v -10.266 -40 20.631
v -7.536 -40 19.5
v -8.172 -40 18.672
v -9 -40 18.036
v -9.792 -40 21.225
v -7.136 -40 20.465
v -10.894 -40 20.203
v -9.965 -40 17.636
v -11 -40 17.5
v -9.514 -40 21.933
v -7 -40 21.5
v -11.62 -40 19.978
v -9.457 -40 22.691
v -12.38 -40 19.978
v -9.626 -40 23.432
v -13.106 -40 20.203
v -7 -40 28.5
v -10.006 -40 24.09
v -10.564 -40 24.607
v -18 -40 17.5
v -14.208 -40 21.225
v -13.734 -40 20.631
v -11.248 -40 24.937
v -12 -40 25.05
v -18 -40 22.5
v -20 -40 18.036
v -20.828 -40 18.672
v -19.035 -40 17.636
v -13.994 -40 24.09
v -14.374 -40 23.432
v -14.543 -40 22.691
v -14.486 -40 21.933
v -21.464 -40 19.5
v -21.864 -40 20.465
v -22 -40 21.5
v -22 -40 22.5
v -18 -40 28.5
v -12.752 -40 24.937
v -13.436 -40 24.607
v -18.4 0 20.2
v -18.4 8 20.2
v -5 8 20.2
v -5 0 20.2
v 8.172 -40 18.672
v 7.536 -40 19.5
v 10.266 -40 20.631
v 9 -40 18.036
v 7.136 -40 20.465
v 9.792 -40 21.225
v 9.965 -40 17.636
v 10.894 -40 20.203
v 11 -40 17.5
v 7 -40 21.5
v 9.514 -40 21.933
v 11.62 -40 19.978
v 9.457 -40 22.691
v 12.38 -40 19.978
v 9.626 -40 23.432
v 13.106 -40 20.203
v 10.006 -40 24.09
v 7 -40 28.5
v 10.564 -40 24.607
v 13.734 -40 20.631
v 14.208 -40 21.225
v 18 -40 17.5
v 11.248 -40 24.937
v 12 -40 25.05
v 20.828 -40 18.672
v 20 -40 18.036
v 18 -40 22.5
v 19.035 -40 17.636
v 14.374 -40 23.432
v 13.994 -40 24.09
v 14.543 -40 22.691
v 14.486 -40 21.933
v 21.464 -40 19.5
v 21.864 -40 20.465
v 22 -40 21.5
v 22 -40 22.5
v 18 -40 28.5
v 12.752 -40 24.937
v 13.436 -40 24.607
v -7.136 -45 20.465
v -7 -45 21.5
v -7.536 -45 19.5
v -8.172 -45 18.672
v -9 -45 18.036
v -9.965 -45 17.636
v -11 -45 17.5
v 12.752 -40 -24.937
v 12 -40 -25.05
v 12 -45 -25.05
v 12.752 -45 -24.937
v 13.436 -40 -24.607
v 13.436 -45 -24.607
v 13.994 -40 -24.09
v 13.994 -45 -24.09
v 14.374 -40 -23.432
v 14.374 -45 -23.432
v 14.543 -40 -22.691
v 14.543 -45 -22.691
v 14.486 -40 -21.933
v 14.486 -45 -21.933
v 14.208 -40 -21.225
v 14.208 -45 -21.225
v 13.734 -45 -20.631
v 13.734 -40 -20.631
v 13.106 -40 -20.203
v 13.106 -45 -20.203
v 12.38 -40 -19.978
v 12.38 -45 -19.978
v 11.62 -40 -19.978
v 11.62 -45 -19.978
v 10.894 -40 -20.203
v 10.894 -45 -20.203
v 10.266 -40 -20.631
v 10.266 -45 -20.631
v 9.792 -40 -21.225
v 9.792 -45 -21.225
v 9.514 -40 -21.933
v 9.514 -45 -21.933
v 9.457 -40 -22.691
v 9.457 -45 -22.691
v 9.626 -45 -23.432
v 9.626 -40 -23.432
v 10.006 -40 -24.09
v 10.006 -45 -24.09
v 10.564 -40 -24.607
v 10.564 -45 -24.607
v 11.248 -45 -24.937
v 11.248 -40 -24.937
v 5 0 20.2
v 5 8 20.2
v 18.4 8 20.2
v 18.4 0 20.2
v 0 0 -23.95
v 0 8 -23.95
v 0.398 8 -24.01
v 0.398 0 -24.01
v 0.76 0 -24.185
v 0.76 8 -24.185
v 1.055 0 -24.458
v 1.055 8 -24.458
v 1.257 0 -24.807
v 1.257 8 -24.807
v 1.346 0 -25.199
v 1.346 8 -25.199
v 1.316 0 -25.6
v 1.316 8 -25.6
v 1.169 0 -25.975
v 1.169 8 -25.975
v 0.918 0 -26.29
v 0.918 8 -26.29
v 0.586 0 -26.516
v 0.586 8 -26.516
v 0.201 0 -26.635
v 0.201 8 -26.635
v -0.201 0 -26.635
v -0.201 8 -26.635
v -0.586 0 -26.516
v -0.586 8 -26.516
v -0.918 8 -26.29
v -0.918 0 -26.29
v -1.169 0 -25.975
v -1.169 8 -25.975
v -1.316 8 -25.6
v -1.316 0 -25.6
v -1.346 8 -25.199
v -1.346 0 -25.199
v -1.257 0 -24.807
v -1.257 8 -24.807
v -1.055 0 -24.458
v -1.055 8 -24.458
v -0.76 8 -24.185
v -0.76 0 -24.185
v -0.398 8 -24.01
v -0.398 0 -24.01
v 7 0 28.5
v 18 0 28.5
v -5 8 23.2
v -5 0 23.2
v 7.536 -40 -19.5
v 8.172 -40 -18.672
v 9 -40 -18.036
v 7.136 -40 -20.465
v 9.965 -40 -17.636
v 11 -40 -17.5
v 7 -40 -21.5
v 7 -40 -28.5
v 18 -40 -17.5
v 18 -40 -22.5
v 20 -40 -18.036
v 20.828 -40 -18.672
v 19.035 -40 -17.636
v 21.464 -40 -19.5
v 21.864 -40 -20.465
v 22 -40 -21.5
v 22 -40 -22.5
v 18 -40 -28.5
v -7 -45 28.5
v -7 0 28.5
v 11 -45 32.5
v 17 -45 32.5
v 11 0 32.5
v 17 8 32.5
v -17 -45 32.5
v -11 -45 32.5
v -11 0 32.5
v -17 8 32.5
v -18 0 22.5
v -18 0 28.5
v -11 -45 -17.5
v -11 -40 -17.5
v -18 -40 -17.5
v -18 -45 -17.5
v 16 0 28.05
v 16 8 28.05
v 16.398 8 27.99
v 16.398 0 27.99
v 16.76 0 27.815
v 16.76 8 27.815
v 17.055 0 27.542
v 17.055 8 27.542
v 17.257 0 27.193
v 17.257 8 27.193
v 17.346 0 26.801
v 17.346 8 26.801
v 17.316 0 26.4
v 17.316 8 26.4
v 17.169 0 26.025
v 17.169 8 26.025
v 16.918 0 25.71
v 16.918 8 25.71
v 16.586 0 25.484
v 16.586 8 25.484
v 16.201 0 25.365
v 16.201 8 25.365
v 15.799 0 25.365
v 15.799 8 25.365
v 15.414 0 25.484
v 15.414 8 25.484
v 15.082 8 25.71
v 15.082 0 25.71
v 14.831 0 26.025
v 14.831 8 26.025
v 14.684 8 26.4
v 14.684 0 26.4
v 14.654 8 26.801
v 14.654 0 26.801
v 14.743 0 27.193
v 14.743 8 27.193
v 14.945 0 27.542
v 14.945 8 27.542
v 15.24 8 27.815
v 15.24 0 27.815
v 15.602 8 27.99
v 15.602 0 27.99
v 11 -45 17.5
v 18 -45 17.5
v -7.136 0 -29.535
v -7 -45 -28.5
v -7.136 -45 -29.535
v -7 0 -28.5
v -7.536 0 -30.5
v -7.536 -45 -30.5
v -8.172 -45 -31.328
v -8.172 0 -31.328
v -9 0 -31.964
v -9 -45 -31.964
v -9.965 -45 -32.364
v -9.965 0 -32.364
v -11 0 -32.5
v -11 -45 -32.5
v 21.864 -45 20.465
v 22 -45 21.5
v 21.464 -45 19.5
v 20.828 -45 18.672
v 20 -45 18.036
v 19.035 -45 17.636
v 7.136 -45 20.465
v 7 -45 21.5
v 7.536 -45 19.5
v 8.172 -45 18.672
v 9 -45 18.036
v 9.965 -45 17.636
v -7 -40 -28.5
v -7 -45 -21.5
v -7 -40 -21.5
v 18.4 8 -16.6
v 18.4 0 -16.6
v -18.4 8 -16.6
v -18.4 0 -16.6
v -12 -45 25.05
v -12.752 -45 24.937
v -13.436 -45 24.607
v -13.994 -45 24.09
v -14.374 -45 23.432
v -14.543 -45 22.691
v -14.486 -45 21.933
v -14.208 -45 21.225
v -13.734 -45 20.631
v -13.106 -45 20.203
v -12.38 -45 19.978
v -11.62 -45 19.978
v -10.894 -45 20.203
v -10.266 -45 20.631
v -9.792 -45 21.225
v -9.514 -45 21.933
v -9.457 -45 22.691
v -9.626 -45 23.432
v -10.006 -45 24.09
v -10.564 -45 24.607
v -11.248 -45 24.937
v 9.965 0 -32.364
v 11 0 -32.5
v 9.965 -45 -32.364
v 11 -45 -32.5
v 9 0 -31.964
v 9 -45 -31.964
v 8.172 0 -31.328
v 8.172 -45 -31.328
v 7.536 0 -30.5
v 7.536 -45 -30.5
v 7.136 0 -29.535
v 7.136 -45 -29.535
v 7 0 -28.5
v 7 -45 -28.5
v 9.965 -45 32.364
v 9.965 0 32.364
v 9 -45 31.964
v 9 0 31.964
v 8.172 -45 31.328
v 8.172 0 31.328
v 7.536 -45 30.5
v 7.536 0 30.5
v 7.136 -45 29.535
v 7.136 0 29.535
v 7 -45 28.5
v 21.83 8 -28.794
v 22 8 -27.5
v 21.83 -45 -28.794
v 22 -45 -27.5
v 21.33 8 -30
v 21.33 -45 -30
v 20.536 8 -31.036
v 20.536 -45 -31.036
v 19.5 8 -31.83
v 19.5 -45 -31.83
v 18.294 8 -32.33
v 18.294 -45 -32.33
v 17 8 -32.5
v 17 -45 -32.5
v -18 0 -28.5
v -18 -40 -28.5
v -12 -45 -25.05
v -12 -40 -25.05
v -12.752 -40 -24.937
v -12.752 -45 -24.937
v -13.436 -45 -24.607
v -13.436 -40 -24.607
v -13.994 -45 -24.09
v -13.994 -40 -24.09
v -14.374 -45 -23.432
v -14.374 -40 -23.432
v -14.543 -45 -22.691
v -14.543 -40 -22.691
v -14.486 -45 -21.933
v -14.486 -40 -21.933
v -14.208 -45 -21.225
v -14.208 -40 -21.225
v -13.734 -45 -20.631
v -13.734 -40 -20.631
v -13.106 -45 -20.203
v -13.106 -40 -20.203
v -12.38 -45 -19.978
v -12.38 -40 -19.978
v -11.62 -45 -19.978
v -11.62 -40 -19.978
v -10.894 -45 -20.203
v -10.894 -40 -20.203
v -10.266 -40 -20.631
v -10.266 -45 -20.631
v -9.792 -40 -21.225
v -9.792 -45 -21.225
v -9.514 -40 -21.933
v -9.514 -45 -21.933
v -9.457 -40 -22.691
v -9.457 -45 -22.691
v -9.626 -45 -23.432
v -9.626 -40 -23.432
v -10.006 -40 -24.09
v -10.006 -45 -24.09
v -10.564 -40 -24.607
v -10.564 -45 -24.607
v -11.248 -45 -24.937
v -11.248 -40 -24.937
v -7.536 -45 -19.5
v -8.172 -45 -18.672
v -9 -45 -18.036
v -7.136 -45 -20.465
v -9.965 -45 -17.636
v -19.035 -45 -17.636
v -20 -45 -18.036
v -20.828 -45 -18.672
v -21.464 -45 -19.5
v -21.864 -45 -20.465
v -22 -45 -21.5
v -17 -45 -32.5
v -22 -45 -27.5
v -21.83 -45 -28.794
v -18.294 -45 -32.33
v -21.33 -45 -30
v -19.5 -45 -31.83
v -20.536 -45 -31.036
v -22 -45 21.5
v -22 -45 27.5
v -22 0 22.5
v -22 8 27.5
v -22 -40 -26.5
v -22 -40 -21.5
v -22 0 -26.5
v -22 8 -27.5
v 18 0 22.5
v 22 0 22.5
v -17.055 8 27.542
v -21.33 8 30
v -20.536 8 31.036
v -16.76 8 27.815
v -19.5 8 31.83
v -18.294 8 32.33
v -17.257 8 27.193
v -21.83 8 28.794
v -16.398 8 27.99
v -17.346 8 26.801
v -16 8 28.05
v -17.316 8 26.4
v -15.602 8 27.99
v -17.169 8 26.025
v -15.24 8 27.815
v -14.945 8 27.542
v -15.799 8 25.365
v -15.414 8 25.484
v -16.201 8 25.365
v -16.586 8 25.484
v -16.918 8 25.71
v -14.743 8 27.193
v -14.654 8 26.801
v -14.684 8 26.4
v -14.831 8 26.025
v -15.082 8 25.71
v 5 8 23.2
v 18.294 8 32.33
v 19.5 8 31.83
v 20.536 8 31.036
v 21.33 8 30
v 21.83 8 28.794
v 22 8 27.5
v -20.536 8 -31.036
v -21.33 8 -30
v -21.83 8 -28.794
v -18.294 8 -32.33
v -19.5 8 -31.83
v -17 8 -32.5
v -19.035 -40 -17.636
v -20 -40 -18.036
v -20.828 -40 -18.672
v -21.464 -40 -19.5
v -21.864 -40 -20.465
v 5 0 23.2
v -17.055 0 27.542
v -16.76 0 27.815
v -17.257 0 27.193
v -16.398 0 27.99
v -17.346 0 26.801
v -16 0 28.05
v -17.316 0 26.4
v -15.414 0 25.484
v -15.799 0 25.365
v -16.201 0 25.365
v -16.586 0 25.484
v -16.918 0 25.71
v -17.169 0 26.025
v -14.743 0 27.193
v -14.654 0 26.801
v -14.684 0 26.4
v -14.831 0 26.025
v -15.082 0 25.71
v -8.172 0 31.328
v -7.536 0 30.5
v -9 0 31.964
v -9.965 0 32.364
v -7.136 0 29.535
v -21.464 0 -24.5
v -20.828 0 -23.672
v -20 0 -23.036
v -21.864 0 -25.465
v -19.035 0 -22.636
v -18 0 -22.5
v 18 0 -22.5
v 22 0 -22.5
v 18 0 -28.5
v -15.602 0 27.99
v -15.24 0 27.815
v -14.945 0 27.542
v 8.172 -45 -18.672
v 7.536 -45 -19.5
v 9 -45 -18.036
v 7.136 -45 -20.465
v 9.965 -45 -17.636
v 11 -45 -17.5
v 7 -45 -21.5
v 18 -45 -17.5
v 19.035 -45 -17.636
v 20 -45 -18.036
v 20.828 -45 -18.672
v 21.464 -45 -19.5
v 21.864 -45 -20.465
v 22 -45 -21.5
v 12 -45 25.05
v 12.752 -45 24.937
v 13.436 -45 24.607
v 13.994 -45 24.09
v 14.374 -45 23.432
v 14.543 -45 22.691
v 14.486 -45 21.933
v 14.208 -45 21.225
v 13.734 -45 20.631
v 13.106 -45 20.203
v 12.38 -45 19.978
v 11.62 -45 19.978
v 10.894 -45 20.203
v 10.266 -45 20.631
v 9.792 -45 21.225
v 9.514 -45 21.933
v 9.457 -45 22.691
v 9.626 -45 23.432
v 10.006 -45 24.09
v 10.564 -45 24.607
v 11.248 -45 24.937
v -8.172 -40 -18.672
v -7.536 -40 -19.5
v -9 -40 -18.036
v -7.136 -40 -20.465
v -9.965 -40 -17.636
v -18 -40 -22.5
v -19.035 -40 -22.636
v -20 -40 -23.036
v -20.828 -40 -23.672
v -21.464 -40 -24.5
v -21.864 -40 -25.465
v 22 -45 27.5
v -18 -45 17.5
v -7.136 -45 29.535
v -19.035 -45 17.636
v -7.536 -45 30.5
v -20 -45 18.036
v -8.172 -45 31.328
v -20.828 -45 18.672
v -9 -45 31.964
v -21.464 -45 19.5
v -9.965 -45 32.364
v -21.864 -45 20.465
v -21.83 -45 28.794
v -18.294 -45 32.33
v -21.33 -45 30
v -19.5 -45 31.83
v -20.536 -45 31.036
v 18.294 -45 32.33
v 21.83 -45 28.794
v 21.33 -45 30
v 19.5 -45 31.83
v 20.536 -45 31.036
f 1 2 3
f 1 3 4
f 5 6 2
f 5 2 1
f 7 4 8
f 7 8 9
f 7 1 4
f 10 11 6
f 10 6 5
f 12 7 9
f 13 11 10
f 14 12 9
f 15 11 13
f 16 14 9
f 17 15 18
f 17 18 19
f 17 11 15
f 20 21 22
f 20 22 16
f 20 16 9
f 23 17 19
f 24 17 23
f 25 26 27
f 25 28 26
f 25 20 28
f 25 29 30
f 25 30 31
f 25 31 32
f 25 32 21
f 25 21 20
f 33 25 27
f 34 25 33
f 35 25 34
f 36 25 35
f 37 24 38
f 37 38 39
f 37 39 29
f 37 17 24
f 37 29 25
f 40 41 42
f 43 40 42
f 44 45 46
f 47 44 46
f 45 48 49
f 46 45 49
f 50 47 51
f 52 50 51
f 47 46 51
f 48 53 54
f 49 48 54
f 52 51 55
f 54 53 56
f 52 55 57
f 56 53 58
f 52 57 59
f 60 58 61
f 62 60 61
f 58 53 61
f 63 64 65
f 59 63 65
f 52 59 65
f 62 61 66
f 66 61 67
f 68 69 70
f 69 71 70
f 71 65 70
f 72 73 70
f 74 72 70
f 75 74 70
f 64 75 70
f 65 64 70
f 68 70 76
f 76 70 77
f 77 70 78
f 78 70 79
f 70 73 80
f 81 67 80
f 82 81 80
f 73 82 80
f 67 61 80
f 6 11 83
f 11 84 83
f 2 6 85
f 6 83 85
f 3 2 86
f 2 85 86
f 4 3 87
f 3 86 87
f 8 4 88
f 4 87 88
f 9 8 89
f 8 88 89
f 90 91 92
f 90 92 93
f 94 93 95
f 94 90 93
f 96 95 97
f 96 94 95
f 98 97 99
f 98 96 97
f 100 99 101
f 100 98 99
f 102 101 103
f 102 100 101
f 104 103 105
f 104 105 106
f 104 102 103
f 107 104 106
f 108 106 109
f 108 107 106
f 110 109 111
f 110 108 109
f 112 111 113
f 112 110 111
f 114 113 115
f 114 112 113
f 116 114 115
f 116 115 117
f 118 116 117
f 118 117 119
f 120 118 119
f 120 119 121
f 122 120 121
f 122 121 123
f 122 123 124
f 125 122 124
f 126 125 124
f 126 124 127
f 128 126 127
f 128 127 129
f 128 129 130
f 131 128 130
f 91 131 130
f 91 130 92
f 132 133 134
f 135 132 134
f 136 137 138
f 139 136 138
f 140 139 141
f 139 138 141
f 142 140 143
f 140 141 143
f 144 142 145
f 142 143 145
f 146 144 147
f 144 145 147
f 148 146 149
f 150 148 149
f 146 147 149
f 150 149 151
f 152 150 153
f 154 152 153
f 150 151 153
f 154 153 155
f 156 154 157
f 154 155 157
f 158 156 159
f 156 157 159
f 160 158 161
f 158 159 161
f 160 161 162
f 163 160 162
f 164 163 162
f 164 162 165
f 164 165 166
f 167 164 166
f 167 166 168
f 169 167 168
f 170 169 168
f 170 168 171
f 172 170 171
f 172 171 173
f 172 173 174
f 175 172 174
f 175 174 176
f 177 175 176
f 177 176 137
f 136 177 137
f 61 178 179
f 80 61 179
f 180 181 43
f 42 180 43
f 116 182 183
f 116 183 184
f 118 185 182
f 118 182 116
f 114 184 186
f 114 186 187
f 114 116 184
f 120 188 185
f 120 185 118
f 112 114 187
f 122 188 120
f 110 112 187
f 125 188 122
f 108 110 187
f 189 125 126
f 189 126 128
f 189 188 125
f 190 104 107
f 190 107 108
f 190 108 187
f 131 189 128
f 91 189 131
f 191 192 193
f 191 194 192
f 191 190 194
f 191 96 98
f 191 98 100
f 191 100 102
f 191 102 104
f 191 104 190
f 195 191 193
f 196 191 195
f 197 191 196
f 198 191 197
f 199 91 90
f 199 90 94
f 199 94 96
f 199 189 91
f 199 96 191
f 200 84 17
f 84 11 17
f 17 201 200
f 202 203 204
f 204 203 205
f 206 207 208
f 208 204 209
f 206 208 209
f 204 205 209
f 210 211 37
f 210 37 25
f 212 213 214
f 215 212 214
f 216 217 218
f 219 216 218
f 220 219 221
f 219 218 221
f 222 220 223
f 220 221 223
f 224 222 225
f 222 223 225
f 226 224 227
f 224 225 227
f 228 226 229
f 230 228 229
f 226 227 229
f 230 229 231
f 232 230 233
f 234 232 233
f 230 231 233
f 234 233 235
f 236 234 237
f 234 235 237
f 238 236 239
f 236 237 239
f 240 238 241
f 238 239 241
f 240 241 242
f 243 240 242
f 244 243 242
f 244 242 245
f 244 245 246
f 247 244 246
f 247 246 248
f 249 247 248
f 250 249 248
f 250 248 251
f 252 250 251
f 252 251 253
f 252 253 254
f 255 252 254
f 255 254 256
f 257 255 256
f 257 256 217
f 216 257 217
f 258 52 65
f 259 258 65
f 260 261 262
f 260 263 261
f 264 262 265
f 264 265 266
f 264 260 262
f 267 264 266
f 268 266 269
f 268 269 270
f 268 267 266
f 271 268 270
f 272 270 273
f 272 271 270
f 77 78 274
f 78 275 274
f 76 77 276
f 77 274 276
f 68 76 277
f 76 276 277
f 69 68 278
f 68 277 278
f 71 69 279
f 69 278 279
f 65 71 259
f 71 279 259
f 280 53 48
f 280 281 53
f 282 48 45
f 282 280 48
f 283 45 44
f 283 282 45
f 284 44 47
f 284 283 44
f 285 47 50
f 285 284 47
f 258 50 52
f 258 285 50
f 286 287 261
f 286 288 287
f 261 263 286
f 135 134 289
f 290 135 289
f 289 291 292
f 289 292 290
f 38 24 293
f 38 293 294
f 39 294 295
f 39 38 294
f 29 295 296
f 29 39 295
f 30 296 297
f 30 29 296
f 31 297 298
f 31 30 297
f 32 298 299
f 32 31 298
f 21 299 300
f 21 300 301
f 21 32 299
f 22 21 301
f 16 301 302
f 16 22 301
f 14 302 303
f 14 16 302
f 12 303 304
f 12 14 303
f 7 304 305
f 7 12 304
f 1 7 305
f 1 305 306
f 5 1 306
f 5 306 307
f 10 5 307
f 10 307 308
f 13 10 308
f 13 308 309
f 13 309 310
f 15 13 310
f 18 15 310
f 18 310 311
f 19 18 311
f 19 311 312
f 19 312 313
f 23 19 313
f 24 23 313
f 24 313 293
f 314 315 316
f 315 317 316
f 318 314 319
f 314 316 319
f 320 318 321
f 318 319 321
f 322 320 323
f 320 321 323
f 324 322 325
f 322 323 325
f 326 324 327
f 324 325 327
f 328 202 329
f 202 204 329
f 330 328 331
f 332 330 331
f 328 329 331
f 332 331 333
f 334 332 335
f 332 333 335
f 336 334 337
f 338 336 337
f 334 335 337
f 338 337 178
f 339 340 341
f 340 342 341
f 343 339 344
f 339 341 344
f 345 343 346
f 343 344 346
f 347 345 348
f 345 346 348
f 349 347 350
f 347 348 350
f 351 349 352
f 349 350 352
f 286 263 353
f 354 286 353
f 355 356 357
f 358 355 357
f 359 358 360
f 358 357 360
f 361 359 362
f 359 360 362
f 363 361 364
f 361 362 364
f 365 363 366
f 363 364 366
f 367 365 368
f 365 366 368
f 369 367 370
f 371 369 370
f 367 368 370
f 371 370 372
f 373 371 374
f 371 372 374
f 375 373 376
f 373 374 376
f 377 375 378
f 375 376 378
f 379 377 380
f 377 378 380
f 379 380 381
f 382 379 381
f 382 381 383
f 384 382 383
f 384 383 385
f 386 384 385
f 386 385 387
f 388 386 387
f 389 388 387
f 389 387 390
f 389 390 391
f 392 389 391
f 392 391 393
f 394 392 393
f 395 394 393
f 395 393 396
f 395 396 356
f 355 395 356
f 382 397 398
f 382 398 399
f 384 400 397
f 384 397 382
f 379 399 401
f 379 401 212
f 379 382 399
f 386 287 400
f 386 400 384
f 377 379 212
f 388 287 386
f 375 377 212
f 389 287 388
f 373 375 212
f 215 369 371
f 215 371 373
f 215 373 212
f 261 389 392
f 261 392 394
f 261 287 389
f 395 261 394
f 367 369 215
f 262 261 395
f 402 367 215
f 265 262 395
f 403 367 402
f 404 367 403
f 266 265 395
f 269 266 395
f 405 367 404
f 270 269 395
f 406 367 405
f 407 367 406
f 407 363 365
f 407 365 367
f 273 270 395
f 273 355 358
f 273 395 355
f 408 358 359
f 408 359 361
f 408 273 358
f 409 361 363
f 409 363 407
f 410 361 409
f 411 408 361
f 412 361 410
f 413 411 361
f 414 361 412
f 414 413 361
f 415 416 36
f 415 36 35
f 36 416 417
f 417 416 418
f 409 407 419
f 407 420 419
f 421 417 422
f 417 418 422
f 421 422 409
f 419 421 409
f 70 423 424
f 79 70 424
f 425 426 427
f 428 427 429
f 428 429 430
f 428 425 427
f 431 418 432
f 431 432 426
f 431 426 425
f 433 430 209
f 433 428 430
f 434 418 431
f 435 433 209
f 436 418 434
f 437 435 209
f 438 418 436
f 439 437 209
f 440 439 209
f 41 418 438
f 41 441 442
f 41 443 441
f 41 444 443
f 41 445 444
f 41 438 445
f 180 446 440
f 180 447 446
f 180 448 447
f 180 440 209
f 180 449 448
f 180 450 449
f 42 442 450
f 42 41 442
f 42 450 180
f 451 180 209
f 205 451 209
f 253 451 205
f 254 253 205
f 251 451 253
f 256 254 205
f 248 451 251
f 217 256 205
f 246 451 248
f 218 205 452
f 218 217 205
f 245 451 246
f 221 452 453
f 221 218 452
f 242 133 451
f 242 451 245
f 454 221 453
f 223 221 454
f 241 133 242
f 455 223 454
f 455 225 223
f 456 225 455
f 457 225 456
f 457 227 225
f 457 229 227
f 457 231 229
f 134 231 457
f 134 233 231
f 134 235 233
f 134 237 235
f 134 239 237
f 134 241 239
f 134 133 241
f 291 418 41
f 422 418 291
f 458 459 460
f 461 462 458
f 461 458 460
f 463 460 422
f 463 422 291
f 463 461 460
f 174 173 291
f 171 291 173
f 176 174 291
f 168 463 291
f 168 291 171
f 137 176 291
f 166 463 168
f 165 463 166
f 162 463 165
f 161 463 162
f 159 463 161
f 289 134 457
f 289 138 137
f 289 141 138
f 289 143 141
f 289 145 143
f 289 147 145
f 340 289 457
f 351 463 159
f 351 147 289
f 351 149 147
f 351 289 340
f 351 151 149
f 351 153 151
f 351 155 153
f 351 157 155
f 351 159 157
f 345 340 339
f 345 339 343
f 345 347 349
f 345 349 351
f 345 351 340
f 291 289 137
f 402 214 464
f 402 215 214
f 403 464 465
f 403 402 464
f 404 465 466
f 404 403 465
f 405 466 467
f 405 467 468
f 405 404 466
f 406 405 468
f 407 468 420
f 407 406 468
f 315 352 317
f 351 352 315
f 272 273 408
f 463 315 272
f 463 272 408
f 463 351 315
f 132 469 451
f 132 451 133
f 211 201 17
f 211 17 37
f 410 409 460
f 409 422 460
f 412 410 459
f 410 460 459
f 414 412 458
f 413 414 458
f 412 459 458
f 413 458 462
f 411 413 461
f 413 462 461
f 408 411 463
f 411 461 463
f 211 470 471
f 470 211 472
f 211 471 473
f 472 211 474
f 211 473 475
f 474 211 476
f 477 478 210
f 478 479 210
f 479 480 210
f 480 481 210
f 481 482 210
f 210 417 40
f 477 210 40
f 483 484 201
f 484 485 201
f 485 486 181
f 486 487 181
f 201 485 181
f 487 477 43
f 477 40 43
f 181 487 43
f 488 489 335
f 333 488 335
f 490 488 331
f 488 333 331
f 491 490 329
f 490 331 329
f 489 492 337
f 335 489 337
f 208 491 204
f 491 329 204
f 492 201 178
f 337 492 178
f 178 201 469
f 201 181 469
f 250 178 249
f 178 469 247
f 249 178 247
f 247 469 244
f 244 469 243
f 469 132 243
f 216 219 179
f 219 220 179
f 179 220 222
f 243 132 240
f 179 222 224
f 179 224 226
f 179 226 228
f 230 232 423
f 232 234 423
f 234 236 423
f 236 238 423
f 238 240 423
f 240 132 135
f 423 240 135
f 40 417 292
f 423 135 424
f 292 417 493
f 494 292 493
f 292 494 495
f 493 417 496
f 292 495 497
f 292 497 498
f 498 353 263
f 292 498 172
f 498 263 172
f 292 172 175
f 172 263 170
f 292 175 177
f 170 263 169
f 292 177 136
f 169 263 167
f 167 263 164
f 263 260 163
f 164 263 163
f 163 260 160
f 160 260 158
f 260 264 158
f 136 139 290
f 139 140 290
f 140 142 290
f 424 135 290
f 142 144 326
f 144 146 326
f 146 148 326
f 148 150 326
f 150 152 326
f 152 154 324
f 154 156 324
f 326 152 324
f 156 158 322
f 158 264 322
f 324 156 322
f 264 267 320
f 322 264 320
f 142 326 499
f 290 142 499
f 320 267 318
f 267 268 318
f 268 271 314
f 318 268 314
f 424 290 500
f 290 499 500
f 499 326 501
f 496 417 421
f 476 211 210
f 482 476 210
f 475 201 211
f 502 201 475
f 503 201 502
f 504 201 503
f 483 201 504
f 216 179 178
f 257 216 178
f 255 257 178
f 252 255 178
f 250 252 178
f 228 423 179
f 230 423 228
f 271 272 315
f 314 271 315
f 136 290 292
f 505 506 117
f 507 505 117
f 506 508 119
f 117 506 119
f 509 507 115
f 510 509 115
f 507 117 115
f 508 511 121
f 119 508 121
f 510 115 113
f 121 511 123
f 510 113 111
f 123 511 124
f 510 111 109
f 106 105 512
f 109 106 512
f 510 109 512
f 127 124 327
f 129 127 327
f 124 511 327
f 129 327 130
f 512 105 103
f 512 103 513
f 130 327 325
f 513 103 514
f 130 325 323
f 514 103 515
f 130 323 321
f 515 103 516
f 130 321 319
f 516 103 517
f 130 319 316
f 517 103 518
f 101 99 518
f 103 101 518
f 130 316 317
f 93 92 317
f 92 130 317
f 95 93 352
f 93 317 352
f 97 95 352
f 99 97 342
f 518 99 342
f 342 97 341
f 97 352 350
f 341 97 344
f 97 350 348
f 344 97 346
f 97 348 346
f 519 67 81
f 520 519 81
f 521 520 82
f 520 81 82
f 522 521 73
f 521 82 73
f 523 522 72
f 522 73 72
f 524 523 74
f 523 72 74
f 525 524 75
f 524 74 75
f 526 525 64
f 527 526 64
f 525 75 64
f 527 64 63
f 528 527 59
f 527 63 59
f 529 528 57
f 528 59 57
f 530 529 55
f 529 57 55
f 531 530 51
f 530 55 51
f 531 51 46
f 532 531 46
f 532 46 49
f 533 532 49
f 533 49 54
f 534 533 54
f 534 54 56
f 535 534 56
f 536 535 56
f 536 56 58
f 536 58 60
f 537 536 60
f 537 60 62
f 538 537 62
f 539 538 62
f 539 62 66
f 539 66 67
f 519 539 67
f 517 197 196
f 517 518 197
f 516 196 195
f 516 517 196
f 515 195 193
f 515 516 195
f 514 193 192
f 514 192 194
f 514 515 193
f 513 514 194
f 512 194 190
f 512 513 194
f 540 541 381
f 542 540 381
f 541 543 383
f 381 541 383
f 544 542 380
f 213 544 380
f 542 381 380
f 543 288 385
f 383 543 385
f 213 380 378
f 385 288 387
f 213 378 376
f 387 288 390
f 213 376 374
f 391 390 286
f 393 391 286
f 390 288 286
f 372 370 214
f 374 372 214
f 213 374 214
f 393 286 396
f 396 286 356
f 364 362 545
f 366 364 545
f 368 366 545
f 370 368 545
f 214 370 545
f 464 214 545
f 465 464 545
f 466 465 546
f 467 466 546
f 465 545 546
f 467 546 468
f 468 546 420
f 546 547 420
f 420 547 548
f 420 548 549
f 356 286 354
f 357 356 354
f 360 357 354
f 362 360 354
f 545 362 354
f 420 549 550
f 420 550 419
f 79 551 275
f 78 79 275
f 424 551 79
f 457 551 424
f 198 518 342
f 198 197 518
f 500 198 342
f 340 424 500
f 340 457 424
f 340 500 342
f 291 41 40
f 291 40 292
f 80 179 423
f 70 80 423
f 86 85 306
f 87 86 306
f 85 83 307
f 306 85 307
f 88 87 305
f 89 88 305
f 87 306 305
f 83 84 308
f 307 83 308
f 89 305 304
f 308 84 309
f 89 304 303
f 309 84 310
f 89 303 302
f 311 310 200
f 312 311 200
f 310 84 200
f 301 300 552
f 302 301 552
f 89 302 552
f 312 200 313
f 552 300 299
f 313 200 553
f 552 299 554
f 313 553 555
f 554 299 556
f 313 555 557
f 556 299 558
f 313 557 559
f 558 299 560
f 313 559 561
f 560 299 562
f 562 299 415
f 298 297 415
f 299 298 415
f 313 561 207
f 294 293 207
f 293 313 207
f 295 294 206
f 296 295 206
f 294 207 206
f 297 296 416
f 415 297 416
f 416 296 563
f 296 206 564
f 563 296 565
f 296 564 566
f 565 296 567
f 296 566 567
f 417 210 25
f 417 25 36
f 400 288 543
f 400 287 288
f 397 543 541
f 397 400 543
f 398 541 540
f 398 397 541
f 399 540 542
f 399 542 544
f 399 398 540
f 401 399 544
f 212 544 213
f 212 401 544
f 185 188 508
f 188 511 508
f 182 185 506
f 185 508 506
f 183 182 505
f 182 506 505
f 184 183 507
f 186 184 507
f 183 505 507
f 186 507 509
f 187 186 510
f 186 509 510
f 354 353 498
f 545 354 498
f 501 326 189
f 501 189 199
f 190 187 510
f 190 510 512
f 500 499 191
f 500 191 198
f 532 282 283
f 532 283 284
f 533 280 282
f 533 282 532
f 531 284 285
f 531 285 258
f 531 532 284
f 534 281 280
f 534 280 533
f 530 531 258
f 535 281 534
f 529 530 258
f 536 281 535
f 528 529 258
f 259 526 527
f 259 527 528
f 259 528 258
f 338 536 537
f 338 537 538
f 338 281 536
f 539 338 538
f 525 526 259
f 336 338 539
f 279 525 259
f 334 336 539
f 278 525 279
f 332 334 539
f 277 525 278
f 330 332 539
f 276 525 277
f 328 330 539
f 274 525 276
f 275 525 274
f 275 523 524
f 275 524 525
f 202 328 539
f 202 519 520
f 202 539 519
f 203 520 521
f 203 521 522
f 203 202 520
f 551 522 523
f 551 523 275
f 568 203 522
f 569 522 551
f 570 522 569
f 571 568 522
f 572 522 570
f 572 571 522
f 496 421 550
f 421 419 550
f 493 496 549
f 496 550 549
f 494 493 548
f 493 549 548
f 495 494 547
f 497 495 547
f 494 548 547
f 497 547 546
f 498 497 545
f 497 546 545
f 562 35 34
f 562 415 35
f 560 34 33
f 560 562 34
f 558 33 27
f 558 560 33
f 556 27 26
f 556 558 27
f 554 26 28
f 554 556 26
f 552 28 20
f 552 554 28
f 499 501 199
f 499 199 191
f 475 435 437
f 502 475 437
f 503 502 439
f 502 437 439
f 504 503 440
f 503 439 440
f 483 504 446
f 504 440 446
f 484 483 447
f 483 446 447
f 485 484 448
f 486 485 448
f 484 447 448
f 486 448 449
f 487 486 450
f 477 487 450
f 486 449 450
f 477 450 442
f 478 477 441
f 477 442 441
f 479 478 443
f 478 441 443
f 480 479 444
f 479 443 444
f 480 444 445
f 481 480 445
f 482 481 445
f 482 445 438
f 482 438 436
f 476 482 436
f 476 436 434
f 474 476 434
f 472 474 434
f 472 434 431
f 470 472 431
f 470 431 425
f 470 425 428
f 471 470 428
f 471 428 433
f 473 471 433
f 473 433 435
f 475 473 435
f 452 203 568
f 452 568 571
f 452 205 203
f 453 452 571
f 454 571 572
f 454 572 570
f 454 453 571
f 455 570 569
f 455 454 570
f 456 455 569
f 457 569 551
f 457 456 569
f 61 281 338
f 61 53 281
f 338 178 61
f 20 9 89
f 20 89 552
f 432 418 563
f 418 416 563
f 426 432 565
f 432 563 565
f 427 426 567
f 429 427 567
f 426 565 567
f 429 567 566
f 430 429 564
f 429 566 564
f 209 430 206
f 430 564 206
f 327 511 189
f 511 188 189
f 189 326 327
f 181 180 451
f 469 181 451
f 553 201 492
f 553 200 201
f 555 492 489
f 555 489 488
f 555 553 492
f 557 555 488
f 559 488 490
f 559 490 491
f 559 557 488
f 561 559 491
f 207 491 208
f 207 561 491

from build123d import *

# Parameters (mm, degrees)
SKETCH1_W               = 44
SKETCH1_H               = 65
BOSS_EXTRUDE1_DEPTH     = 8
CUT_EXTRUDE1_REACH      = 42.053
SKETCH2_W               = 36.8
SKETCH2_H               = 36.8
CUT_EXTRUDE2_REACH      = 42.053
SKETCH3_R               = 1.35
BOSS_EXTRUDE2_DEPTH     = 40
SKETCH6_W               = 15
SKETCH6_H               = 15
BOSS_EXTRUDE3_DEPTH     = 5
CUT_EXTRUDE3_REACH      = 64.002
SKETCH7_R               = 2.55
MIRROR2_COPY_1_DEPTH    = 40
MIRROR2_COPY_2_SKETCH_W = 15
MIRROR2_COPY_2_SKETCH_H = 15
MIRROR2_COPY_2_DEPTH    = 5
MIRROR2_COPY_3_REACH    = 64.002
MIRROR2_COPY_3_SKETCH_R = 2.55
CUT_EXTRUDE4_REACH      = 67.949
SKETCH8_W               = 10
SKETCH8_H               = 3
FILLET1_R               = 4
FILLET2_R               = 5


with BuildPart() as part:
    # Sketch1 → Boss-Extrude1 (new body)
    with BuildSketch(Plane(origin=(0, 0, 0), x_dir=(1, 0, 0), z_dir=(0, 1, 0))):
        Rectangle(SKETCH1_W, SKETCH1_H)
    extrude(amount=BOSS_EXTRUDE1_DEPTH)

    # Sketch2 → Cut-Extrude1 (cut, up to next)
    with BuildSketch(Plane(origin=(0, 8, 0), x_dir=(1, 0, 0), z_dir=(0, 1, 0)), mode=Mode.PRIVATE) as cut_extrude1_sk1:
        with Locations((0, -1.8)):
            Rectangle(SKETCH2_W, SKETCH2_H)
    cut_extrude1_tool1 = extrude(cut_extrude1_sk1.sketch, amount=-CUT_EXTRUDE1_REACH, mode=Mode.PRIVATE) & part.part
    add(cut_extrude1_tool1.solids().sort_by_distance((0, 8, 1.8))[0], mode=Mode.SUBTRACT)

    # Sketch3 → Cut-Extrude2 (cut, up to next)
    with BuildSketch(Plane(origin=(0, 8, 0), x_dir=(1, 0, 0), z_dir=(0, 1, 0)), mode=Mode.PRIVATE) as cut_extrude2_sk1:
        with Locations(Location((-16, -26.7, 0), (0, 0, 270))):
            Circle(SKETCH3_R)
    cut_extrude2_tool1 = extrude(cut_extrude2_sk1.sketch, amount=-CUT_EXTRUDE2_REACH, mode=Mode.PRIVATE) & part.part
    # Sketch3 → Cut-Extrude2 (cut, up to next)
    with BuildSketch(Plane(origin=(0, 8, 0), x_dir=(1, 0, 0), z_dir=(0, 1, 0)), mode=Mode.PRIVATE) as cut_extrude2_sk2:
        with Locations(Location((16, -26.7, 0), (0, 0, 270))):
            Circle(SKETCH3_R)
    cut_extrude2_tool2 = extrude(cut_extrude2_sk2.sketch, amount=-CUT_EXTRUDE2_REACH, mode=Mode.PRIVATE) & part.part
    # Sketch3 → Cut-Extrude2 (cut, up to next)
    with BuildSketch(Plane(origin=(0, 8, 0), x_dir=(1, 0, 0), z_dir=(0, 1, 0)), mode=Mode.PRIVATE) as cut_extrude2_sk3:
        with Locations(Location((0, 25.3, 0), (0, 0, 270))):
            Circle(SKETCH3_R)
    cut_extrude2_tool3 = extrude(cut_extrude2_sk3.sketch, amount=-CUT_EXTRUDE2_REACH, mode=Mode.PRIVATE) & part.part
    add(cut_extrude2_tool1.solids().sort_by_distance((-16, 8, 26.7))[0], mode=Mode.SUBTRACT)
    add(cut_extrude2_tool2.solids().sort_by_distance((16, 8, 26.7))[0], mode=Mode.SUBTRACT)
    add(cut_extrude2_tool3.solids().sort_by_distance((0, 8, -25.3))[0], mode=Mode.SUBTRACT)

    # Sketch5 → Boss-Extrude2 (add)
    with BuildSketch(Plane.XZ):
        Polygon((22, 32.5), (7, 32.5), (7, 28.5), (18, 28.5), (18, 22.5), (22, 22.5), align=None)
    boss_extrude2 = extrude(amount=BOSS_EXTRUDE2_DEPTH)

    # Sketch6 → Boss-Extrude3 (add)
    with BuildSketch(Plane.XZ.offset(40)):
        with Locations((14.5, 25)):
            Rectangle(SKETCH6_W, SKETCH6_H)
    boss_extrude3 = extrude(amount=BOSS_EXTRUDE3_DEPTH)

    # Sketch7 → Cut-Extrude3 (cut, up to next)
    with BuildSketch(Plane(origin=(0, -40, 0), x_dir=(1, 0, 0), z_dir=(0, 1, 0)), mode=Mode.PRIVATE) as cut_extrude3_sk1:
        with Locations(Location((12, -22.5, 0), (0, 0, 270))):
            Circle(SKETCH7_R)
    cut_extrude3_tool1 = extrude(cut_extrude3_sk1.sketch, amount=-CUT_EXTRUDE3_REACH, mode=Mode.PRIVATE) & part.part
    cut_extrude3 = cut_extrude3_tool1.solids().sort_by_distance((12, -40, 22.5))[0]
    add(cut_extrude3, mode=Mode.SUBTRACT)

    # Mirror1: Boss-Extrude2, Boss-Extrude3, Cut-Extrude3 across plane
    add(boss_extrude2.mirror(Plane(origin=(0, 0, 0), x_dir=(0, 0, 1), z_dir=(1, 0, 0))))
    add(boss_extrude3.mirror(Plane(origin=(0, 0, 0), x_dir=(0, 0, 1), z_dir=(1, 0, 0))))
    add(cut_extrude3.mirror(Plane(origin=(0, 0, 0), x_dir=(0, 0, 1), z_dir=(1, 0, 0))), mode=Mode.SUBTRACT)

    # Mirror2: Boss-Extrude2, Boss-Extrude3, Cut-Extrude3 across plane
    add(boss_extrude2.mirror(Plane.XY))
    add(boss_extrude3.mirror(Plane.XY))
    add(cut_extrude3.mirror(Plane.XY), mode=Mode.SUBTRACT)

    # Mirror2 copy 1 sketch → Mirror2 copy 1 (add)
    with BuildSketch(Plane(origin=(0, 0, 0), x_dir=(-1, 0, 0), z_dir=(0, -1, 0))):
        Polygon((22, 32.5), (7, 32.5), (7, 28.5), (18, 28.5), (18, 22.5), (22, 22.5), align=None)
    extrude(amount=MIRROR2_COPY_1_DEPTH)

    # Mirror2 copy 2 sketch → Mirror2 copy 2 (add)
    with BuildSketch(Plane(origin=(0, -40, 0), x_dir=(-1, 0, 0), z_dir=(0, -1, 0))):
        with Locations((14.5, 25)):
            Rectangle(MIRROR2_COPY_2_SKETCH_W, MIRROR2_COPY_2_SKETCH_H)
    extrude(amount=MIRROR2_COPY_2_DEPTH)

    # Mirror2 copy 3 sketch → Mirror2 copy 3 (cut, up to next)
    with BuildSketch(Plane(origin=(0, -40, 0), x_dir=(-1, 0, 0), z_dir=(0, 1, 0)), mode=Mode.PRIVATE) as mirror2_copy_3_sk1:
        with Locations(Location((12, -22.5, 0), (0, 0, 270))):
            Circle(MIRROR2_COPY_3_SKETCH_R)
    mirror2_copy_3_tool1 = extrude(mirror2_copy_3_sk1.sketch, amount=-MIRROR2_COPY_3_REACH, mode=Mode.PRIVATE) & part.part
    add(mirror2_copy_3_tool1.solids().sort_by_distance((-12, -40, -22.5))[0], mode=Mode.SUBTRACT)

    # Sketch8 → Cut-Extrude4 (cut, up to next)
    with BuildSketch(Plane(origin=(0, 8, 0), x_dir=(1, 0, 0), z_dir=(0, 1, 0)), mode=Mode.PRIVATE) as cut_extrude4_sk1:
        with Locations((0, -21.7)):
            Rectangle(SKETCH8_W, SKETCH8_H)
    cut_extrude4_tool1 = extrude(cut_extrude4_sk1.sketch, amount=-CUT_EXTRUDE4_REACH, mode=Mode.PRIVATE) & part.part
    add(cut_extrude4_tool1.solids().sort_by_distance((0, 8, 21.7))[0], mode=Mode.SUBTRACT)

    # Fillet1
    fillet1_edges = [part.edges().sort_by_distance(p)[0] for p in [
        (7, -22.5, -32.5),
        (22, -42.5, -17.5),
        (7, -42.5, -17.5),
        (-22, -20, -22.5),
        (-7, -22.5, -32.5),
        (-22, -42.5, -17.5),
        (-7, -42.5, -17.5),
        (7, -22.5, 32.5),
        (22, -42.5, 17.5),
        (7, -42.5, 17.5),
        (-7, -22.5, 32.5),
        (-22, -42.5, 17.5),
        (-7, -42.5, 17.5),
    ]]
    fillet(fillet1_edges, radius=FILLET1_R - 0.0001)  # a hair under: the kernel refuses the full size

    # Fillet2
    fillet2_edges = [part.edges().sort_by_distance(p)[0] for p in [
        (-22, -18.5, -32.5),
        (22, -18.5, -32.5),
        (22, -18.5, 32.5),
        (-22, -18.5, 32.5),
    ]]
    fillet(fillet2_edges, radius=FILLET2_R)


solid = part.part
